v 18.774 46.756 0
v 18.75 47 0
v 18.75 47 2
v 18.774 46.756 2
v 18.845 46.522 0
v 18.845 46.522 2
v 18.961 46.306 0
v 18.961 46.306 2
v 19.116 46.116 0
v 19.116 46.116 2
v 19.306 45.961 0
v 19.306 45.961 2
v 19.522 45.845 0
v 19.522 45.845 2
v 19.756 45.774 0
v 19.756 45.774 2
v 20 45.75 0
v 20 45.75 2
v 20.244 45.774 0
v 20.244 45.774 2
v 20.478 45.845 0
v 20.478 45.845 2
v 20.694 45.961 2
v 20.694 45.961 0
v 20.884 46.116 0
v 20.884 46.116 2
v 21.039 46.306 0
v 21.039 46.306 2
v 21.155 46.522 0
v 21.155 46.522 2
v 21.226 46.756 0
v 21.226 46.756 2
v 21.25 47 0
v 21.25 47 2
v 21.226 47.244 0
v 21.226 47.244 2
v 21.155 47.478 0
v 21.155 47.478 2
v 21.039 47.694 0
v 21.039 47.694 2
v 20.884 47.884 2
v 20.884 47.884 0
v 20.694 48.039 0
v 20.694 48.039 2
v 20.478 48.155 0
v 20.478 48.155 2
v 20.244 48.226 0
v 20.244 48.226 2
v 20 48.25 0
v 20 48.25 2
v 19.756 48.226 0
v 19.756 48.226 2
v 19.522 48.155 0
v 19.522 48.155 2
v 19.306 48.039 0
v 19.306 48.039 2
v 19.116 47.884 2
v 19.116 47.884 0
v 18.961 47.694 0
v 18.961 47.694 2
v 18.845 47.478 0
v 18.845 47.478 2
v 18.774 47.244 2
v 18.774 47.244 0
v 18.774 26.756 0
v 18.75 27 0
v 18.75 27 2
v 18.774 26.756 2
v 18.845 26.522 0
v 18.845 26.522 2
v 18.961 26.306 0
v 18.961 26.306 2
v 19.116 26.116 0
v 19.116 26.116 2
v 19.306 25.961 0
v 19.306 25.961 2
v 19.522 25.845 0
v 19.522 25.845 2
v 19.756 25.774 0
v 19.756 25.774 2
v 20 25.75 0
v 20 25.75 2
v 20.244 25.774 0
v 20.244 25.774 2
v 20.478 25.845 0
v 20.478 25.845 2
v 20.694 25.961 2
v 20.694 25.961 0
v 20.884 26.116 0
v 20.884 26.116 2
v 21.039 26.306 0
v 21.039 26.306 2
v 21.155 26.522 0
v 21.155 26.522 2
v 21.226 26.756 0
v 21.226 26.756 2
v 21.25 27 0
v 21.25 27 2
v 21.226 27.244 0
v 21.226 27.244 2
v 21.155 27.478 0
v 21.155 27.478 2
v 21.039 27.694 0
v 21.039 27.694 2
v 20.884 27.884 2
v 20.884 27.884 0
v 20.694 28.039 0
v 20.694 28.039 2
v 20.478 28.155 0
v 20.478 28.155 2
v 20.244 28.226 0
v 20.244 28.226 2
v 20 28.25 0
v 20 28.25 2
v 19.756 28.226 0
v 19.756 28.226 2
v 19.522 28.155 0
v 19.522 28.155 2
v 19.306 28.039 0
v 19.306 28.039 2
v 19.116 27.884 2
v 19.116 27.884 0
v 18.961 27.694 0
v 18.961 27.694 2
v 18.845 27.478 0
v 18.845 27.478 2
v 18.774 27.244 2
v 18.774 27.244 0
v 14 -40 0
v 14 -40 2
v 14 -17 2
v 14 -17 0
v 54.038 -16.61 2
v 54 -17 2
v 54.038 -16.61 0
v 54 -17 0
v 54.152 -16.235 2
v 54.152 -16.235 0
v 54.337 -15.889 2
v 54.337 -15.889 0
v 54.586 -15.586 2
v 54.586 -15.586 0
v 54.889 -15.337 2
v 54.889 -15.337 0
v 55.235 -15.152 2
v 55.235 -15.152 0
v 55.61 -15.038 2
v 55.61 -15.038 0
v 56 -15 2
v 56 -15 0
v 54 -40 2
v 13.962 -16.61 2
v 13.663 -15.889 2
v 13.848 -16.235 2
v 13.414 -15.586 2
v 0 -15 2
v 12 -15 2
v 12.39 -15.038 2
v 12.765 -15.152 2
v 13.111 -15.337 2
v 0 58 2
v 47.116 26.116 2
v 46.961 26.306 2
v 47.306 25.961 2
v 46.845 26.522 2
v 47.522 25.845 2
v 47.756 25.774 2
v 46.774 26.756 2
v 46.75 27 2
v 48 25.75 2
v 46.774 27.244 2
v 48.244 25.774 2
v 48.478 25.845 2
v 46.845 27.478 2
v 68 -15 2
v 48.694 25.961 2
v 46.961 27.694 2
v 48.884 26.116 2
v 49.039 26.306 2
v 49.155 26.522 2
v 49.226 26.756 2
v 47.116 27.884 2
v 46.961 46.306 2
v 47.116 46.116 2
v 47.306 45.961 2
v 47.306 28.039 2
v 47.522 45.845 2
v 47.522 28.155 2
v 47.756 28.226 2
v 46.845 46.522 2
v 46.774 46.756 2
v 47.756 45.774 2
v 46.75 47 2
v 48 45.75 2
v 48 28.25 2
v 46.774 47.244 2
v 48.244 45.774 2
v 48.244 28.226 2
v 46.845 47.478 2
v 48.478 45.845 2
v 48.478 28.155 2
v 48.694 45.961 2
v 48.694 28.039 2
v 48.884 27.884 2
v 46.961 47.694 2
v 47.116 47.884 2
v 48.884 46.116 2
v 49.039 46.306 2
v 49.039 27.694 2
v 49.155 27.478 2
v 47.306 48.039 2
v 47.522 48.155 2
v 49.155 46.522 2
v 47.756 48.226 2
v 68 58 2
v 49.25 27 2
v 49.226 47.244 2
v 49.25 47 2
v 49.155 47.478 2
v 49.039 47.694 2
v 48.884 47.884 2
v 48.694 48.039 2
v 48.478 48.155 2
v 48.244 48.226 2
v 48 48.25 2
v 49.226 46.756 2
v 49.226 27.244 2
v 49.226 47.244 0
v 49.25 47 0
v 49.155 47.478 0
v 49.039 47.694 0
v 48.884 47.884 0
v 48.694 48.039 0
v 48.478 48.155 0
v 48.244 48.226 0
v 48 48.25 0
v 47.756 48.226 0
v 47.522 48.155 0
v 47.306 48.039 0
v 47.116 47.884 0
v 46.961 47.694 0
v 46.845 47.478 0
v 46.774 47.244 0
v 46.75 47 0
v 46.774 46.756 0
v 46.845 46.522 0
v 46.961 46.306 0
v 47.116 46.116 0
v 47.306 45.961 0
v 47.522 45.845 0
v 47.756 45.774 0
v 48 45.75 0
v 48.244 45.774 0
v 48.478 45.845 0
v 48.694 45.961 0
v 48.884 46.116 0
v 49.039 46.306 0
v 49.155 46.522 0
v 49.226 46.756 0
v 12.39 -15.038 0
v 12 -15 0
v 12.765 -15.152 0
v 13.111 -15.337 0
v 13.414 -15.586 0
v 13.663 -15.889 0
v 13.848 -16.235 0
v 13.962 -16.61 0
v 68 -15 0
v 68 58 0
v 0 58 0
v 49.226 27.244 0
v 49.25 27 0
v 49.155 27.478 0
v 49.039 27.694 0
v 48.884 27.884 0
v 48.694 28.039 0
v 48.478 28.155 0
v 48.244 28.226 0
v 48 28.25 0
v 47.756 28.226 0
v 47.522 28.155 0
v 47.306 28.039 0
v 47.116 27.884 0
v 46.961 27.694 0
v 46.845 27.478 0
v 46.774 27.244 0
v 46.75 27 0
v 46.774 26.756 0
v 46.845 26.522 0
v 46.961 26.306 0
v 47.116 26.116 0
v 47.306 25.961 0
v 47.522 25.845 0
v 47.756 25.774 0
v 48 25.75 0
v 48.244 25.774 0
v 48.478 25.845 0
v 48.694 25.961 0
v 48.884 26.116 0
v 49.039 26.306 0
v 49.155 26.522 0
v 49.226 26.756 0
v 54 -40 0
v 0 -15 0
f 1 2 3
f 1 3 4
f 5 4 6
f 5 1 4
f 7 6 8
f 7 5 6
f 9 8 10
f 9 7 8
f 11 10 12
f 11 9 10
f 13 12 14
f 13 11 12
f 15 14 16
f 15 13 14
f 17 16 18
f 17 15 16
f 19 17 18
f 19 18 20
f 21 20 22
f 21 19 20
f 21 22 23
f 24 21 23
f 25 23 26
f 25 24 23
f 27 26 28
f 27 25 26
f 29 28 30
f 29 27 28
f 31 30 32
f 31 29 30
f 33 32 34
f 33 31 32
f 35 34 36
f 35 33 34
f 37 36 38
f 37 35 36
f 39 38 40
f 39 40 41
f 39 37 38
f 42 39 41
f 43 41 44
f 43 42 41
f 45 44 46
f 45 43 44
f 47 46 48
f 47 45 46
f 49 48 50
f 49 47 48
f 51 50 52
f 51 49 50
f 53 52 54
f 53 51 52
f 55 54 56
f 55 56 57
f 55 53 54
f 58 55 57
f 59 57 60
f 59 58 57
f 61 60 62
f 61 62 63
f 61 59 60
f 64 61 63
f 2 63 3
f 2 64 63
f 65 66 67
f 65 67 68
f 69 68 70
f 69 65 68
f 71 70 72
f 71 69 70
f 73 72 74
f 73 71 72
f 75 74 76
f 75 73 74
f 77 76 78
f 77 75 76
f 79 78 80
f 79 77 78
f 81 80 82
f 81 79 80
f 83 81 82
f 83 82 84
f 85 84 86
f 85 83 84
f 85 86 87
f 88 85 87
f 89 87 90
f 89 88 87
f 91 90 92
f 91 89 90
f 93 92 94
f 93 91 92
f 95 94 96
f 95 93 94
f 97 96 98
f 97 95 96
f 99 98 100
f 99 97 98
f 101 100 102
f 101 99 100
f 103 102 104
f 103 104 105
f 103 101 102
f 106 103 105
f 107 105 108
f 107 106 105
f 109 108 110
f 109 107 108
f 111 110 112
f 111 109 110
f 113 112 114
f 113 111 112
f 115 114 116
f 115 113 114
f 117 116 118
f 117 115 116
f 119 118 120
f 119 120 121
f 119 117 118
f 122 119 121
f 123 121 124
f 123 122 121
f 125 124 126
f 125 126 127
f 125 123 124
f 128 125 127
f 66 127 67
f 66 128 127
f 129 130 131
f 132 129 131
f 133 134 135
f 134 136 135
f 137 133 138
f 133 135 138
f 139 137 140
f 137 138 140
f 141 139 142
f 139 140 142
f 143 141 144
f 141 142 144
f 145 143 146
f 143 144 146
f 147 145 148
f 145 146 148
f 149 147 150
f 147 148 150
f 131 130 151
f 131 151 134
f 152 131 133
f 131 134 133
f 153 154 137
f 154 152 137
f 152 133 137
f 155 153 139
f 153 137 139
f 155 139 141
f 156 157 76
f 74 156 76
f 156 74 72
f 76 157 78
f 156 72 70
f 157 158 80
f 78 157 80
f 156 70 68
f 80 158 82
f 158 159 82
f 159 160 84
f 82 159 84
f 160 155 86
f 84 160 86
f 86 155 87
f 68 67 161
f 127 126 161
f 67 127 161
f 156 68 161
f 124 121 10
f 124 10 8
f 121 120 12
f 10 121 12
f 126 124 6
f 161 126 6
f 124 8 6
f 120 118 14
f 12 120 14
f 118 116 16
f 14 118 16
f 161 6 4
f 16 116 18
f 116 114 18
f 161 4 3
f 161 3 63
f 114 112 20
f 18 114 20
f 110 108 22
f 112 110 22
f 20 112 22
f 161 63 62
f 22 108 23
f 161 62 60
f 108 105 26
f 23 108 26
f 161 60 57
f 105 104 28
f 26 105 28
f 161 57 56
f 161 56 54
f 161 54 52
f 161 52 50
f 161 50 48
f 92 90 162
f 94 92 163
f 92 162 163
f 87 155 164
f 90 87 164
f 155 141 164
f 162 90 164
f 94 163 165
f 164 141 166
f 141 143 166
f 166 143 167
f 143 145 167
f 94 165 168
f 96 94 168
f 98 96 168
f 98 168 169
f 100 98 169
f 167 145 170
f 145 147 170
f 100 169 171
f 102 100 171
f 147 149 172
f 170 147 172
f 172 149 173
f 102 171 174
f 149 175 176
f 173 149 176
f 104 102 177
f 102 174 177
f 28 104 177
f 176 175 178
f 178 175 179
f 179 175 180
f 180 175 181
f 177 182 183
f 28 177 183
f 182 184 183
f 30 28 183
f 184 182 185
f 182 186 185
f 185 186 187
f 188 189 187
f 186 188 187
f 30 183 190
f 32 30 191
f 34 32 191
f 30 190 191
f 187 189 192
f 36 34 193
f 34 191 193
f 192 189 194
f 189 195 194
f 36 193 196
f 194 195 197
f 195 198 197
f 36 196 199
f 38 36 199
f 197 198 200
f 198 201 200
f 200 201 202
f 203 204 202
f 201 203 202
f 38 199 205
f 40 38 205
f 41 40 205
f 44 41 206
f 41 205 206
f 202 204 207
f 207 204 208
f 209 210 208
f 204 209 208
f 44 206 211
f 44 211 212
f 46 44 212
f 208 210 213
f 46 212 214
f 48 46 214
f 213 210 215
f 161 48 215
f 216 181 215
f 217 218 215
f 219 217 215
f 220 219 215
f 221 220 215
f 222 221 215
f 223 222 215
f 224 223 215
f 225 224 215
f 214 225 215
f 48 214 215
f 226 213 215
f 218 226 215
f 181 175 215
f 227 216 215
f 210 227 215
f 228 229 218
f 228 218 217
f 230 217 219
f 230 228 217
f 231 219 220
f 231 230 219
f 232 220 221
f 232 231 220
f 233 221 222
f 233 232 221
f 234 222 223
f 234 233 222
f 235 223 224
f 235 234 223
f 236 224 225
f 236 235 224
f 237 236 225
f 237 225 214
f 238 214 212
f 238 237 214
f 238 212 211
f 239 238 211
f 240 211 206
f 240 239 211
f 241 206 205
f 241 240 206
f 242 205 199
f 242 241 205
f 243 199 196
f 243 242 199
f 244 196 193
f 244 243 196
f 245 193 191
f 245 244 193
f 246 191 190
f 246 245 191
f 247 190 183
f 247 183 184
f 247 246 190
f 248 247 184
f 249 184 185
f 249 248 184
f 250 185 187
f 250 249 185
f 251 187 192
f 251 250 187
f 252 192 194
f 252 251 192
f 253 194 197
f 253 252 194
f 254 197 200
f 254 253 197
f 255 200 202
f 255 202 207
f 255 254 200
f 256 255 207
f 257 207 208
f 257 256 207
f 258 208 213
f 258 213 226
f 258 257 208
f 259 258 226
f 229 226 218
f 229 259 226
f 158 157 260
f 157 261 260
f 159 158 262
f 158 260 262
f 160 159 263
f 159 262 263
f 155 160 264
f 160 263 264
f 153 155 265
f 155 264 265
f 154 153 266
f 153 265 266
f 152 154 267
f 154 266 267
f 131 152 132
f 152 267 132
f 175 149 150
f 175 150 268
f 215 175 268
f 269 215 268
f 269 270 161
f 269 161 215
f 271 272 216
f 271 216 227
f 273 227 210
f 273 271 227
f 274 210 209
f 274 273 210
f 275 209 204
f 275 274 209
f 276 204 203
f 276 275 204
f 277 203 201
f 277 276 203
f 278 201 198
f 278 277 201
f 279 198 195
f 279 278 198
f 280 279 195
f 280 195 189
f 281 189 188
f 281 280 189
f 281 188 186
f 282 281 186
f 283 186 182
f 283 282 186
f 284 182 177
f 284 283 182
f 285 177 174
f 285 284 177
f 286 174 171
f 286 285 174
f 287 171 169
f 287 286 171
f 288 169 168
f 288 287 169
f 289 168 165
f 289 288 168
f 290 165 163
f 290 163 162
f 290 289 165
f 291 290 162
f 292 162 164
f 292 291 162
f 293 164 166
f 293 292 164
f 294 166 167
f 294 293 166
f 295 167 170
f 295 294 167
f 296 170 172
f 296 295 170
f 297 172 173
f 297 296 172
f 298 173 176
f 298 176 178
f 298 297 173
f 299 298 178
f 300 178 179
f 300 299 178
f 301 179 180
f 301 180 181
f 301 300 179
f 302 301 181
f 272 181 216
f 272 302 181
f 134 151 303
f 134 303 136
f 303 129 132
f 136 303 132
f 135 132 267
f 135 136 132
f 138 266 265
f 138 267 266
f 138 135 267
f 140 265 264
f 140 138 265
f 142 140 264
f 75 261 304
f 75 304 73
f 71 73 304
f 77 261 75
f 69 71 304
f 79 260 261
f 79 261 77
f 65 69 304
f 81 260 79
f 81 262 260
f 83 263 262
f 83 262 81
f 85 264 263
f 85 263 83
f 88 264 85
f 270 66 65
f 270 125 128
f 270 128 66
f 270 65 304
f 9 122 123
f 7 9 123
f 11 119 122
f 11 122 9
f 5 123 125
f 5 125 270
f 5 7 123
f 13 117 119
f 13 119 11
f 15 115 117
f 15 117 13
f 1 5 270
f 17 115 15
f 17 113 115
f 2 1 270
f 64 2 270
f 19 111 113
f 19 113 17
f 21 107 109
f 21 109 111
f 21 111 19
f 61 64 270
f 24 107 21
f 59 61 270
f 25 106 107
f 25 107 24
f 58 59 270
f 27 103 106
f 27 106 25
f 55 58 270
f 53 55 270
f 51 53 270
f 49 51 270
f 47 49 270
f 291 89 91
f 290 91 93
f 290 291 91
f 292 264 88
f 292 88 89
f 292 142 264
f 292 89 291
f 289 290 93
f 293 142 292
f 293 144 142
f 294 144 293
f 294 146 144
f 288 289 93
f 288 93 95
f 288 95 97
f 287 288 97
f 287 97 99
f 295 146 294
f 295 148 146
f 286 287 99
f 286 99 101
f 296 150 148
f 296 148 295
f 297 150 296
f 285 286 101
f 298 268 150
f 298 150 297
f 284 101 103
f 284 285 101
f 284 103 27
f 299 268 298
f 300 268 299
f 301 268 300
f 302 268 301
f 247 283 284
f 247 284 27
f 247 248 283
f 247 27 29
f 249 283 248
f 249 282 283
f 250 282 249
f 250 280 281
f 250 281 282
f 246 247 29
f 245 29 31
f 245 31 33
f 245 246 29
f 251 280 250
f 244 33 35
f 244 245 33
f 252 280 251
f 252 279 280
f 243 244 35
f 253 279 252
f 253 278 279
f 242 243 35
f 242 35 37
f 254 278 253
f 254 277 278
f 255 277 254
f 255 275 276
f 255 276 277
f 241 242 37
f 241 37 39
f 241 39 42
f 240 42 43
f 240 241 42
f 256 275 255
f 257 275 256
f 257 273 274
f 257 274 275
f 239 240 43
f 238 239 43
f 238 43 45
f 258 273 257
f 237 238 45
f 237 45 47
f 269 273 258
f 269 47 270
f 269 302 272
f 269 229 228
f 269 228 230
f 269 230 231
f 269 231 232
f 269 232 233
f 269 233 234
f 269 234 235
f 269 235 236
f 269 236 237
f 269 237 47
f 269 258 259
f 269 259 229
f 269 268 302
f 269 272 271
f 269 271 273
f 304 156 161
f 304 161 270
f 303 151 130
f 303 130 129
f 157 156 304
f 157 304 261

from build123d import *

# Parameters (mm, degrees)
SKETCH_1_W          = 68
SKETCH_1_H          = 58
SKETCH_1_R          = 1.25
EXTRUDE_1_DEPTH     = 2
SKETCH_2_W          = 2
SKETCH_2_H          = 40
EXTRUDE_2_DEPTH     = 68
SKETCH_3_W          = 14
SKETCH_3_H          = 25
CUT_EXTRUDE_1_DEPTH = 10
FILLET_1_R          = 2


with BuildPart() as part:
    # 草图1 → 凸台-拉伸1 (new body)
    with BuildSketch(Plane.XY):
        with Locations((34, 29)):
            Rectangle(SKETCH_1_W, SKETCH_1_H)
        with Locations((48, 27)):
            Circle(SKETCH_1_R, mode=Mode.SUBTRACT)
        with Locations(Location((20, 27, 0), (0, 0, 180))):
            Circle(SKETCH_1_R, mode=Mode.SUBTRACT)
        with Locations((48, 47)):
            Circle(SKETCH_1_R, mode=Mode.SUBTRACT)
        with Locations(Location((20, 47, 0), (0, 0, 180))):
            Circle(SKETCH_1_R, mode=Mode.SUBTRACT)
    extrude(amount=EXTRUDE_1_DEPTH)

    # 草图2 → 凸台-拉伸2 (add)
    with BuildSketch(Plane(origin=(68, 0, 0), x_dir=(0, 0, -1), z_dir=(1, 0, 0))):
        with Locations((-1, -20)):
            Rectangle(SKETCH_2_W, SKETCH_2_H)
    extrude(amount=-EXTRUDE_2_DEPTH)

    # 草图3 → 切除-拉伸1 (cut)
    with BuildSketch(Plane.XY.offset(2)):
        with Locations((61, -27.5)):
            Rectangle(SKETCH_3_W, SKETCH_3_H)
        with Locations((7, -27.5)):
            Rectangle(SKETCH_3_W, SKETCH_3_H)
    extrude(amount=-CUT_EXTRUDE_1_DEPTH, mode=Mode.SUBTRACT)

    # 圆角1
    fillet_1_edges = [part.edges().sort_by_distance(p)[0] for p in [
        (54, -15, 1),
        (14, -15, 1),
    ]]
    fillet(fillet_1_edges, radius=FILLET_1_R)


solid = part.part
